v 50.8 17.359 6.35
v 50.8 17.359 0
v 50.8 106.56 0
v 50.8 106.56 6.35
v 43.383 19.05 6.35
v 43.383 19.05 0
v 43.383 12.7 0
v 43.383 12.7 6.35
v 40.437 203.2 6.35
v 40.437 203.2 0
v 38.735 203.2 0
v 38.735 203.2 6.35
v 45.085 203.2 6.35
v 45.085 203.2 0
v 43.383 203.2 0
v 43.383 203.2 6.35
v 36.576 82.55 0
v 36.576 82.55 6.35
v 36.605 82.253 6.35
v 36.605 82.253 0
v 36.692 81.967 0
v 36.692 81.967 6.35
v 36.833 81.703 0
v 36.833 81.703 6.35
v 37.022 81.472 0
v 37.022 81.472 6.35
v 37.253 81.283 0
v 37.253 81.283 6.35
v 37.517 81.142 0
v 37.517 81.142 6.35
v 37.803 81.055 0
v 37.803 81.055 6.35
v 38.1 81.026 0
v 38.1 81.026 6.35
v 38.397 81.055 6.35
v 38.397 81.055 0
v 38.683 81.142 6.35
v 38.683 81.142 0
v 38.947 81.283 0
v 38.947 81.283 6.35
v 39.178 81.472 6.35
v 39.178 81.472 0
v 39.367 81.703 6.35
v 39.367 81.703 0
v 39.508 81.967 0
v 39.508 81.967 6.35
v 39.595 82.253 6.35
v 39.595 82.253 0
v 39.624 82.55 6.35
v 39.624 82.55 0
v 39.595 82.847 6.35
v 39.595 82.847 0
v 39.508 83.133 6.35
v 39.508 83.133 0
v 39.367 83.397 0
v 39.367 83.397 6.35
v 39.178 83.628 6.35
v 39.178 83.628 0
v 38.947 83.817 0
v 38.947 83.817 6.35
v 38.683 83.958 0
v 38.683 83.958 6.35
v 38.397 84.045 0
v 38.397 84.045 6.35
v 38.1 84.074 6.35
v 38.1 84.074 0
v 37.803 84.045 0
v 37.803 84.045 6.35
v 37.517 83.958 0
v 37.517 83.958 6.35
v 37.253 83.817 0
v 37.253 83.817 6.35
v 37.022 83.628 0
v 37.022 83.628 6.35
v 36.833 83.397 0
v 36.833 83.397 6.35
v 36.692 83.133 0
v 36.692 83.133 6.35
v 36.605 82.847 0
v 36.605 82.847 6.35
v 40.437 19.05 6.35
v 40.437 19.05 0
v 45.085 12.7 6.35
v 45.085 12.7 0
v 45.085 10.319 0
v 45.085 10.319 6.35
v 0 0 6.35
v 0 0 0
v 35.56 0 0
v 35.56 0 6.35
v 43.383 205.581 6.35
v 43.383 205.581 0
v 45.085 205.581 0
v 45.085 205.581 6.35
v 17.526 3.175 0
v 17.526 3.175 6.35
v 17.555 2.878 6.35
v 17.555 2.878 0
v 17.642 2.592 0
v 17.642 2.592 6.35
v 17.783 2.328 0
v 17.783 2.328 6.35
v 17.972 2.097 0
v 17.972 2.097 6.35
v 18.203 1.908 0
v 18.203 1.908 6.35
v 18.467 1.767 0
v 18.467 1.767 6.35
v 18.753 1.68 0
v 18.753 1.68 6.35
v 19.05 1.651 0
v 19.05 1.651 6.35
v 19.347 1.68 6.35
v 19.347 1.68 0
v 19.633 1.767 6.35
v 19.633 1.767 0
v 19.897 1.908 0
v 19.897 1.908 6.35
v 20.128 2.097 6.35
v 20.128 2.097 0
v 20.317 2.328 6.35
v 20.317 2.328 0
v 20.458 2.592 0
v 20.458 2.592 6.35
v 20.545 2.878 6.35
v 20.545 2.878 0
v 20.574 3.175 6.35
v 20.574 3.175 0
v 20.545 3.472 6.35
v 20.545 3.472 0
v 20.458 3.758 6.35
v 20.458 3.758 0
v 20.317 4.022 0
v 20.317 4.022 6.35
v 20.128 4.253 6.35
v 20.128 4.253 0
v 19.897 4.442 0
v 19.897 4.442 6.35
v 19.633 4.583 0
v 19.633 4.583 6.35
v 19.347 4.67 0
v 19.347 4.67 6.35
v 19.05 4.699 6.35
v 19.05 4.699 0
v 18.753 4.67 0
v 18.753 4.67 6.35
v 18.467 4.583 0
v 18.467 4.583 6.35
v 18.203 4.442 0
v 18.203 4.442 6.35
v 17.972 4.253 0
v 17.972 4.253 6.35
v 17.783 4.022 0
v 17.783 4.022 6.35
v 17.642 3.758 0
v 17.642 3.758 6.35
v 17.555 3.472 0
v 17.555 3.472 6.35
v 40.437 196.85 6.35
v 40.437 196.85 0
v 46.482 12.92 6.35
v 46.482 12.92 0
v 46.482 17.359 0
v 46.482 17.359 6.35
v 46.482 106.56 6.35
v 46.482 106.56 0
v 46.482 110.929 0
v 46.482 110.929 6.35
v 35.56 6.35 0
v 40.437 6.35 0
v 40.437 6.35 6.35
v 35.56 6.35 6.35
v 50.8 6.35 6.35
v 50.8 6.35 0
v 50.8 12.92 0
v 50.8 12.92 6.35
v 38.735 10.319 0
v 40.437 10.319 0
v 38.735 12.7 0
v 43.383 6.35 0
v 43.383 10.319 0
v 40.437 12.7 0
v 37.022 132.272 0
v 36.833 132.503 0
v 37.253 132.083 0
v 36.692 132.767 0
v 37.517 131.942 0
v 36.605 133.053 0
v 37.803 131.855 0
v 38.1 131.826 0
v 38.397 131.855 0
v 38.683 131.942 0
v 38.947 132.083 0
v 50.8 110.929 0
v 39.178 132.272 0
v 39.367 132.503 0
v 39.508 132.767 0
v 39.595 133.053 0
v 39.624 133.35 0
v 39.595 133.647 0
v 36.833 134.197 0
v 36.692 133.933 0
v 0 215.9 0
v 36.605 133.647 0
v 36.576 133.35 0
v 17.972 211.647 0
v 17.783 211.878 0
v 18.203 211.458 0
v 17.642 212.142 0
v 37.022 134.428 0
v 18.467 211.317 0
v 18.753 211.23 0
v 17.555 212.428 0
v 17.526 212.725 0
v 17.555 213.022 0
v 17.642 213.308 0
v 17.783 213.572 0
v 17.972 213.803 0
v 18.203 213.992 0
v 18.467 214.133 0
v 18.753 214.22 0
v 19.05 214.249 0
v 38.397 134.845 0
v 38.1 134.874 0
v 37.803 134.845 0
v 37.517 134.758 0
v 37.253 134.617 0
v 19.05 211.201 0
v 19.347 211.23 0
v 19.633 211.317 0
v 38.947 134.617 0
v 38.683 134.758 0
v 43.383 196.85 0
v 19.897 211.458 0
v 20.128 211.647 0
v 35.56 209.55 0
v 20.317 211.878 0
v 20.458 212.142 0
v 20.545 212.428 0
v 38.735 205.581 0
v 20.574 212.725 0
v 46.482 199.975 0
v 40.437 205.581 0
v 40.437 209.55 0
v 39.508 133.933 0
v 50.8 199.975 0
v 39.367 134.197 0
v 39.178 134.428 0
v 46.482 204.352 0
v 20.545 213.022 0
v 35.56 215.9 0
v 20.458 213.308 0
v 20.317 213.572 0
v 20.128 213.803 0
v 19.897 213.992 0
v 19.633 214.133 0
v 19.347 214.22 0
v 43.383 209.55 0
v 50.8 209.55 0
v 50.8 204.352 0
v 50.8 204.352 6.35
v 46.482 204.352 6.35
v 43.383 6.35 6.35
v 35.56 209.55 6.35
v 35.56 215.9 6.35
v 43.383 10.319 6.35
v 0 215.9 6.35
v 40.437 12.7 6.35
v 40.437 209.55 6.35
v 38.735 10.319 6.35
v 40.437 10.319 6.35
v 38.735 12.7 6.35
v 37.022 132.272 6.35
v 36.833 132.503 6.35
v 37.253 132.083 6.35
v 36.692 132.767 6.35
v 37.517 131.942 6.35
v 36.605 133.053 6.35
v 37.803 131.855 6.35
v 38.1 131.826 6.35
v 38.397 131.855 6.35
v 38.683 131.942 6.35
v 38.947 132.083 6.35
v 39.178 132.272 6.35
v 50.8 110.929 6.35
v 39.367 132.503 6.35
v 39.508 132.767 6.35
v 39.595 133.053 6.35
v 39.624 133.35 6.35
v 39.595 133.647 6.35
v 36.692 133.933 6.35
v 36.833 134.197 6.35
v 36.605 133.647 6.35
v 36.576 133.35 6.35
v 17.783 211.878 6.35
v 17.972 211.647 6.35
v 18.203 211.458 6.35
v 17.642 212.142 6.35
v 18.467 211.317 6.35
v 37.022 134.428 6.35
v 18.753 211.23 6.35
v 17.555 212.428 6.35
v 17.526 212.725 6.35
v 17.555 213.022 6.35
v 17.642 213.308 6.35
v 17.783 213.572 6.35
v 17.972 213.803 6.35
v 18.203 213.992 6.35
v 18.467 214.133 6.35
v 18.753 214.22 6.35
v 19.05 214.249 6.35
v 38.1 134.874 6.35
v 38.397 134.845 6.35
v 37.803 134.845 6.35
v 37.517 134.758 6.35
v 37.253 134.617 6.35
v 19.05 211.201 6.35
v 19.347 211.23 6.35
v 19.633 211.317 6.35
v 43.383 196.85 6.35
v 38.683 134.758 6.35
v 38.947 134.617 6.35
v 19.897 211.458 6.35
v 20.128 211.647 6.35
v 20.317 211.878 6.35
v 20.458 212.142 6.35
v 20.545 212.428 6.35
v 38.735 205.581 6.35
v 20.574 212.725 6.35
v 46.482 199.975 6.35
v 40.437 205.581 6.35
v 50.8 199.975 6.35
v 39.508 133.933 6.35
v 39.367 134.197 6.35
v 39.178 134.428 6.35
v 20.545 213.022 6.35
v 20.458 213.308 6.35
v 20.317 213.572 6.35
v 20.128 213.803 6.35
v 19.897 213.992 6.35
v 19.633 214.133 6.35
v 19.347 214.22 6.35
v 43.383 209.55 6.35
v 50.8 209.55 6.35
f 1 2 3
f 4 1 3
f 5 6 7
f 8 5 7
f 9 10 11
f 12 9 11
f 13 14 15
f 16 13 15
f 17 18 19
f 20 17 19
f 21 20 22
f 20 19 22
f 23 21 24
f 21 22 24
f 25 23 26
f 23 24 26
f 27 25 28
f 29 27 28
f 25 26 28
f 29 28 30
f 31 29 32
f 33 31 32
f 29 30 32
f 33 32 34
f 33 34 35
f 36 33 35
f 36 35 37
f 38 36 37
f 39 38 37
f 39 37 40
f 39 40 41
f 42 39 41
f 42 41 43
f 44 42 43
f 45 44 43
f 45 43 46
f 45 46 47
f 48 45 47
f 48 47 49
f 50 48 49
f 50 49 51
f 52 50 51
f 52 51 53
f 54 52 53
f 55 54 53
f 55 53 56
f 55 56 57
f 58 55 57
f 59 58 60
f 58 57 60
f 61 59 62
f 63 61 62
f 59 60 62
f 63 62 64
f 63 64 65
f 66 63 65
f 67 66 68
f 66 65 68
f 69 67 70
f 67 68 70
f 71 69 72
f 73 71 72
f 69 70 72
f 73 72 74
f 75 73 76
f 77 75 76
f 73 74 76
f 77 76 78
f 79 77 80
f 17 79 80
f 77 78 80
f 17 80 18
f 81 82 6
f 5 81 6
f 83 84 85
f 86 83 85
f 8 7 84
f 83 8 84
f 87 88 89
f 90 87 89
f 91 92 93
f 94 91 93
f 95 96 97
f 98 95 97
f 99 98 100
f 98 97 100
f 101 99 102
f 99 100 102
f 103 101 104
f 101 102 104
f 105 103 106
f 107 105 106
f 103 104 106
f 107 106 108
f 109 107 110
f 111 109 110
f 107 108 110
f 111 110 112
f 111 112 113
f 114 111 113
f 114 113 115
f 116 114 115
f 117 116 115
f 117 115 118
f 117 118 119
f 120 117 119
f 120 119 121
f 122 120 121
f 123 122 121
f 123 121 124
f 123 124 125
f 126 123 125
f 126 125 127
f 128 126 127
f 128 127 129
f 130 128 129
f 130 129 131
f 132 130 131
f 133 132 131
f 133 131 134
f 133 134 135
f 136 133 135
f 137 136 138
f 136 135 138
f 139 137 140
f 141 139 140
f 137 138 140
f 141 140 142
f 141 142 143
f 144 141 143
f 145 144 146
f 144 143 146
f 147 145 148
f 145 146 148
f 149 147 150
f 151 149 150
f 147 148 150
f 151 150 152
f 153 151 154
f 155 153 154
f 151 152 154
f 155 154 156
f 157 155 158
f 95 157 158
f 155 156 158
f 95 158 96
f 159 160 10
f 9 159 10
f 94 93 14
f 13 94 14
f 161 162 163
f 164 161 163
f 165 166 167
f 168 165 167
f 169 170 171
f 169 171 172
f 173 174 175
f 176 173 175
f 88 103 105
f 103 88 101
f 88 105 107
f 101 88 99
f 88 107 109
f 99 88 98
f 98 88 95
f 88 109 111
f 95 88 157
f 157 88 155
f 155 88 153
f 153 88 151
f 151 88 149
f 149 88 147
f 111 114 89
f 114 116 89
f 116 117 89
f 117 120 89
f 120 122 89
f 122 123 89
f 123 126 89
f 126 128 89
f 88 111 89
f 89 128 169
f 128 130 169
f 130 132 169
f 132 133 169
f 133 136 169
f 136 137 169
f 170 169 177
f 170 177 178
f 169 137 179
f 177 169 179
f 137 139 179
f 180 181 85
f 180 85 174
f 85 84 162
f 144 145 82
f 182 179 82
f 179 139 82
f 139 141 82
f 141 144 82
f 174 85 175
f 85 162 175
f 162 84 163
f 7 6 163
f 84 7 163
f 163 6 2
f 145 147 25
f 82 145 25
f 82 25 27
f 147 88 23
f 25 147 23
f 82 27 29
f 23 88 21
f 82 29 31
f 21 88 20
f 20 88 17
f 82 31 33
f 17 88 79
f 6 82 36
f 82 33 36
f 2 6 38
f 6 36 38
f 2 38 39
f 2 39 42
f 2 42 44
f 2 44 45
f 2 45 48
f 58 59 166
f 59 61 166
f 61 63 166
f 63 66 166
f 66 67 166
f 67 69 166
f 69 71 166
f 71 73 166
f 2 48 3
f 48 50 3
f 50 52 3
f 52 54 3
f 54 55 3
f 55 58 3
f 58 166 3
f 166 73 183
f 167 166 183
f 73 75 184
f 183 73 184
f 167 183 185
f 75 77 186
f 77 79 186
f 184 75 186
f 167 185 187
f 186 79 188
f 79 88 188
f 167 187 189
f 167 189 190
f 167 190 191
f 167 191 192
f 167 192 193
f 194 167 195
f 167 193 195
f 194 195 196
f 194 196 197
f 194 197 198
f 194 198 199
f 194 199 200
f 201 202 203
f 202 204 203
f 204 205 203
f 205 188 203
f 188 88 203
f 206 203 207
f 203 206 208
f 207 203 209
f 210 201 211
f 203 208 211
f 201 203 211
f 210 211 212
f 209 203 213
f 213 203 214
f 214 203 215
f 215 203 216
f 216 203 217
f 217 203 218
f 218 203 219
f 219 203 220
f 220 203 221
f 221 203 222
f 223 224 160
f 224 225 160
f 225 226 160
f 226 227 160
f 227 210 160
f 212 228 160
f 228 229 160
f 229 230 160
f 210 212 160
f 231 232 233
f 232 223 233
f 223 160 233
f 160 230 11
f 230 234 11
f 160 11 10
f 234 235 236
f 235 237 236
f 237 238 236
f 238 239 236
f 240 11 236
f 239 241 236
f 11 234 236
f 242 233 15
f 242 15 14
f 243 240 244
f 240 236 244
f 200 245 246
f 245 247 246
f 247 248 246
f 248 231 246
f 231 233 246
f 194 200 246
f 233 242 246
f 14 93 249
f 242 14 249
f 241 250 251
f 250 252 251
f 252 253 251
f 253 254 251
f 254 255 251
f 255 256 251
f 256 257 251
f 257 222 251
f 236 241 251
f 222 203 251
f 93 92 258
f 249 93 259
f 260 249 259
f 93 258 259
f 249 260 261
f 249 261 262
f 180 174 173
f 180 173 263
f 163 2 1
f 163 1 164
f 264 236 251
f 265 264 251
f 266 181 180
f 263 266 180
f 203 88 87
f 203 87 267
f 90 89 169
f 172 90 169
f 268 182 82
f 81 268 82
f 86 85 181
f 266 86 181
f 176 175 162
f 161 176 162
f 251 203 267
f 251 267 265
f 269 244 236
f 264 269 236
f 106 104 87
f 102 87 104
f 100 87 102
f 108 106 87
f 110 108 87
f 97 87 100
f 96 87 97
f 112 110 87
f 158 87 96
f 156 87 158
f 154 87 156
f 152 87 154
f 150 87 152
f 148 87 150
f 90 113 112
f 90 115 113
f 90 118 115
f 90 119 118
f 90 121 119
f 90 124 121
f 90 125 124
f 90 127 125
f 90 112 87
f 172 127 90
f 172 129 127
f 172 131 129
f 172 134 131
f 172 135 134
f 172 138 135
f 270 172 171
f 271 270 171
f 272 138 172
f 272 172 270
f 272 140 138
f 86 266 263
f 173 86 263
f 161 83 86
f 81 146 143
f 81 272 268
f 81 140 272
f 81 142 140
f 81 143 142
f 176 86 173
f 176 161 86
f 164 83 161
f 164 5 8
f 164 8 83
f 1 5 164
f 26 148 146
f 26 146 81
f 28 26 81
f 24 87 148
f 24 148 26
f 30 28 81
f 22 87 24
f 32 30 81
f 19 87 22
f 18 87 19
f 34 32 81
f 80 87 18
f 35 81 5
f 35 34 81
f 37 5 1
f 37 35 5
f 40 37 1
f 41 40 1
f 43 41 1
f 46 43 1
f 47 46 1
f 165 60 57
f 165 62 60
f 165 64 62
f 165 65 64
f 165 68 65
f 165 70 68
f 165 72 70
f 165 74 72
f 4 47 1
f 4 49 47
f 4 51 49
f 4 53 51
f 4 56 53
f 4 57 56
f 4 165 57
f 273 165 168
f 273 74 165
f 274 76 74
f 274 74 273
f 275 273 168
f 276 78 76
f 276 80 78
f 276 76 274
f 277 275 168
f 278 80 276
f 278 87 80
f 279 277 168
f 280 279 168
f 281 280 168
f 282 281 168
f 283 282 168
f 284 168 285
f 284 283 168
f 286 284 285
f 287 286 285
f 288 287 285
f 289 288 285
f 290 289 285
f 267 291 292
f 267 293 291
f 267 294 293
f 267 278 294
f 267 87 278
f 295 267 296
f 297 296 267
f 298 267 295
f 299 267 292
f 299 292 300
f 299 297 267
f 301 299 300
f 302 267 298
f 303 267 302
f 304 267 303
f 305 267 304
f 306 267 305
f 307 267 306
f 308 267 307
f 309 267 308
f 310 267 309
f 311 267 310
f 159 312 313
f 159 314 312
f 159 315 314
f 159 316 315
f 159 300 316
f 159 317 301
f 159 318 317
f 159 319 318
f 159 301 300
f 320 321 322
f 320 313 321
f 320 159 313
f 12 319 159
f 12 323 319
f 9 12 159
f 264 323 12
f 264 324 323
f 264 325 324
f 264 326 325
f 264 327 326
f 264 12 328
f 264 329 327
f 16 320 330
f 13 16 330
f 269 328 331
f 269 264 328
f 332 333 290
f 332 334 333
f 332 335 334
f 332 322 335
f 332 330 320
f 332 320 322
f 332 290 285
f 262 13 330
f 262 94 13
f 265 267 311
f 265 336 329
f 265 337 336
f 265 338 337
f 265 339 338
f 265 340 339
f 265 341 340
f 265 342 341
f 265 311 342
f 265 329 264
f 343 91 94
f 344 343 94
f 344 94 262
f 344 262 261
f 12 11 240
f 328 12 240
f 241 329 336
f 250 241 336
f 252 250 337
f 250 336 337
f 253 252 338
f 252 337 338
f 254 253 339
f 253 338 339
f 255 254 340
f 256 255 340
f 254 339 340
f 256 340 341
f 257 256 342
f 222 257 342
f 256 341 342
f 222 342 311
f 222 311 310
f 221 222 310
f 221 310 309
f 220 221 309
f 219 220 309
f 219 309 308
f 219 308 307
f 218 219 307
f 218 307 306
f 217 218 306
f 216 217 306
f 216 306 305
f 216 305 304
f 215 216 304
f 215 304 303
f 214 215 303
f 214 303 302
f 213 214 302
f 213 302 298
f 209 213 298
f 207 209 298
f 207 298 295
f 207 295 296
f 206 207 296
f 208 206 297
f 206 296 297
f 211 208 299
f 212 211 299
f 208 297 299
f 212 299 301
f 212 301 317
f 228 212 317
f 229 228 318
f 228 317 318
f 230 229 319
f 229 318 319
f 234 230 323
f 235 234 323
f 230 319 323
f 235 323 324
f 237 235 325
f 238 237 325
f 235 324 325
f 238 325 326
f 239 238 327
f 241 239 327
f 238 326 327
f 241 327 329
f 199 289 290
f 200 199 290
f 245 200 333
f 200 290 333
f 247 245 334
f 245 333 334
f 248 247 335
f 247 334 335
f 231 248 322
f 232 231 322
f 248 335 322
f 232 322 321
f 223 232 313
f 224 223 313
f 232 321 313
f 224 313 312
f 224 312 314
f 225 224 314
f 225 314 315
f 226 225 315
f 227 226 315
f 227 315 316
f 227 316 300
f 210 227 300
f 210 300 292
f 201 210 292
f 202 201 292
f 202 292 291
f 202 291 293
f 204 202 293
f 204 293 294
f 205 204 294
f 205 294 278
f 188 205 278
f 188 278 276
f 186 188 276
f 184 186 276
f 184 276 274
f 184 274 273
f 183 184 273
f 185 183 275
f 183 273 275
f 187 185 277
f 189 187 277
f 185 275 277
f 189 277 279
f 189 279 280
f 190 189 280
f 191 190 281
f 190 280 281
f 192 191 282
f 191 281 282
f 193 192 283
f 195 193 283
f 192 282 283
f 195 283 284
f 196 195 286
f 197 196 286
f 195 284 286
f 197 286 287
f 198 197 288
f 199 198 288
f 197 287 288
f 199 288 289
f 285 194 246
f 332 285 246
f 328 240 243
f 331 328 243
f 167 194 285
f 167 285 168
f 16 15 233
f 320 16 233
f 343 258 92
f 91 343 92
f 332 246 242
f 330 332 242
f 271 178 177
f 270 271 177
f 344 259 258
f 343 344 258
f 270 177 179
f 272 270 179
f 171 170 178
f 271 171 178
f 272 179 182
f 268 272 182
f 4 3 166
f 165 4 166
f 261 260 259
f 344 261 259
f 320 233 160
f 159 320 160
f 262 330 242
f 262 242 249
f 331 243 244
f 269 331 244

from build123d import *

# Parameters (mm, degrees)
SKETCH1_W                                   = 152.4
SKETCH1_H                                   = 215.9
BOSS_EXTRUDE1_DEPTH                         = 6.35
SKETCH2_R                                   = 1.524
CUT_EXTRUDE1_DEPTH                          = 265.346160366
SKETCH4_R                                   = 1.524
CUT_EXTRUDE2_DEPTH                          = 265.346160366
SKETCH5_R                                   = 1.524
CUT_EXTRUDE3_DEPTH                          = 265.346160366
SKETCH9_W                                   = 81.28
SKETCH9_H                                   = 6.35
CUT_EXTRUDE9_DEPTH                          = 265.346160366
CUT_EXTRUDE10_DEPTH                         = 265.346160366
SKETCH11_W                                  = 50.8
SKETCH11_H                                  = 203.2
CUT_EXTRUDE11_DEPTH                         = 61.976
SKETCH13_W                                  = 4.318
SKETCH13_H                                  = 4.439032047
SKETCH13_H_2                                = 4.376890529
CUT_EXTRUDE12_DEPTH                         = 6.35
SKETCH14_W                                  = 4.318
SKETCH14_H                                  = 4.368724603
CUT_EXTRUDE13_DEPTH                         = 6.35
SKETCH15_W                                  = 125.806146595
SKETCH15_H                                  = 228.6
GETTING_RID_OF_TOP_IMPINGES_WITH_DOOR_DEPTH = 265.346160366


with BuildPart() as part:
    # Sketch1 → Boss-Extrude1 (new body)
    with BuildSketch(Plane.XY):
        with Locations((76.2, 107.95)):
            Rectangle(SKETCH1_W, SKETCH1_H)
    extrude(amount=BOSS_EXTRUDE1_DEPTH)

    # Sketch2 → Cut-Extrude1 (cut, through all)
    with BuildSketch(Plane.XY.offset(6.35)):
        with Locations((19.05, 212.725)):
            Circle(SKETCH2_R)
        with Locations(Location((133.35, 212.725, 0), (0, 0, 180))):
            Circle(SKETCH2_R)
        with Locations((133.35, 3.175)):
            Circle(SKETCH2_R)
        with Locations(Location((19.05, 3.175, 0), (0, 0, 180))):
            Circle(SKETCH2_R)
    extrude(amount=-CUT_EXTRUDE1_DEPTH, mode=Mode.SUBTRACT)

    # Sketch4 → Cut-Extrude2 (cut, through all)
    with BuildSketch(Plane.XY.offset(6.35)):
        with Locations(Location((95.25, 133.35, 0), (0, 0, 180))):
            Circle(SKETCH4_R)
        with Locations((95.25, 82.55)):
            Circle(SKETCH4_R)
    extrude(amount=-CUT_EXTRUDE2_DEPTH, mode=Mode.SUBTRACT)

    # Sketch5 → Cut-Extrude3 (cut, through all)
    with BuildSketch(Plane.XY.offset(6.35)):
        with Locations((38.1, 133.35)):
            Circle(SKETCH5_R)
        with Locations(Location((38.1, 82.55, 0), (0, 0, 180))):
            Circle(SKETCH5_R)
    extrude(amount=-CUT_EXTRUDE3_DEPTH, mode=Mode.SUBTRACT)

    # Sketch9 → Cut-Extrude9 (cut, through all)
    with BuildSketch(Plane(origin=(0, 0, 0), x_dir=(-1, 0, 0), z_dir=(0, 0, -1))):
        with Locations((-76.2, 212.725)):
            Rectangle(SKETCH9_W, SKETCH9_H)
        with Locations((-76.2, 3.175)):
            Rectangle(SKETCH9_W, SKETCH9_H)
    extrude(amount=-CUT_EXTRUDE9_DEPTH, mode=Mode.SUBTRACT)

    # Sketch10 → Cut-Extrude10 (cut, through all)
    with BuildSketch(Plane(origin=(0, 0, 0), x_dir=(-1, 0, 0), z_dir=(0, 0, -1))):
        Polygon((-111.9632, 6.35), (-109.0168, 6.35), (-109.0168, 10.31875), (-107.315, 10.31875), (-107.315, 12.7), (-109.0168, 12.7), (-109.0168, 19.05), (-111.9632, 19.05), (-111.9632, 12.7), (-113.665, 12.7), (-113.665, 10.31875), (-111.9632, 10.31875), align=None)
        Polygon((-107.315, 205.58125), (-107.315, 203.2), (-109.0168, 203.2), (-109.0168, 196.85), (-111.9632, 196.85), (-111.9632, 203.2), (-113.665, 203.2), (-113.665, 205.58125), (-111.9632, 205.58125), (-111.9632, 209.55), (-109.0168, 209.55), (-109.0168, 205.58125), align=None)
        Polygon((-43.3832, 205.58125), (-45.085, 205.58125), (-45.085, 203.2), (-43.3832, 203.2), (-43.3832, 196.85), (-40.4368, 196.85), (-40.4368, 203.2), (-38.735, 203.2), (-38.735, 205.58125), (-40.4368, 205.58125), (-40.4368, 209.55), (-43.3832, 209.55), align=None)
        Polygon((-38.735, 10.31875), (-38.735, 12.7), (-40.4368, 12.7), (-40.4368, 19.05), (-43.3832, 19.05), (-43.3832, 12.7), (-45.085, 12.7), (-45.085, 10.31875), (-43.3832, 10.31875), (-43.3832, 6.35), (-40.4368, 6.35), (-40.4368, 10.31875), align=None)
    extrude(amount=-CUT_EXTRUDE10_DEPTH, mode=Mode.SUBTRACT)

    # Sketch11 → Cut-Extrude11 (cut)
    with BuildSketch(Plane(origin=(0, 0, 0), x_dir=(-1, 0, 0), z_dir=(0, 0, -1))):
        with Locations((-76.2, 107.95)):
            Rectangle(SKETCH11_W, SKETCH11_H)
    extrude(amount=-CUT_EXTRUDE11_DEPTH, mode=Mode.SUBTRACT)


with BuildPart() as cut_extrude11_piece_1:
    # of the separate pieces the step leaves, piece 1, a body of its own (cut_extrude11_pieces)
    add(part.part.solids().sort_by_distance((101.6, 209.55, 0))[0])

    # Sketch15 → Getting rid of top, impinges with door (cut, through all)
    with BuildSketch(Plane.XY.offset(6.35)):
        with Locations((143.333722475, 114.3)):
            Rectangle(SKETCH15_W, SKETCH15_H)
    extrude(amount=-GETTING_RID_OF_TOP_IMPINGES_WITH_DOOR_DEPTH, mode=Mode.SUBTRACT)


with BuildPart() as cut_extrude11_piece_2:
    # of the separate pieces the step leaves, piece 2, a body of its own (cut_extrude11_pieces)
    add(part.part.solids().sort_by_distance((0, 0, 0))[0])

    # Sketch13 → Cut-Extrude12 (cut)
    with BuildSketch(Plane(origin=(0, 0, 0), x_dir=(-1, 0, 0), z_dir=(0, 0, -1))):
        with Locations((-48.641, 15.139283389)):
            Rectangle(SKETCH13_W, SKETCH13_H)
        with Locations((-48.641, 202.163626755)):
            Rectangle(SKETCH13_W, SKETCH13_H_2)
    extrude(amount=-CUT_EXTRUDE12_DEPTH, mode=Mode.SUBTRACT)

    # Sketch14 → Cut-Extrude13 (cut)
    with BuildSketch(Plane(origin=(0, 0, 0), x_dir=(-1, 0, 0), z_dir=(0, 0, -1))):
        with Locations((-48.641, 108.744312397)):
            Rectangle(SKETCH14_W, SKETCH14_H)
    extrude(amount=-CUT_EXTRUDE13_DEPTH, mode=Mode.SUBTRACT)


solid = cut_extrude11_piece_2.part
